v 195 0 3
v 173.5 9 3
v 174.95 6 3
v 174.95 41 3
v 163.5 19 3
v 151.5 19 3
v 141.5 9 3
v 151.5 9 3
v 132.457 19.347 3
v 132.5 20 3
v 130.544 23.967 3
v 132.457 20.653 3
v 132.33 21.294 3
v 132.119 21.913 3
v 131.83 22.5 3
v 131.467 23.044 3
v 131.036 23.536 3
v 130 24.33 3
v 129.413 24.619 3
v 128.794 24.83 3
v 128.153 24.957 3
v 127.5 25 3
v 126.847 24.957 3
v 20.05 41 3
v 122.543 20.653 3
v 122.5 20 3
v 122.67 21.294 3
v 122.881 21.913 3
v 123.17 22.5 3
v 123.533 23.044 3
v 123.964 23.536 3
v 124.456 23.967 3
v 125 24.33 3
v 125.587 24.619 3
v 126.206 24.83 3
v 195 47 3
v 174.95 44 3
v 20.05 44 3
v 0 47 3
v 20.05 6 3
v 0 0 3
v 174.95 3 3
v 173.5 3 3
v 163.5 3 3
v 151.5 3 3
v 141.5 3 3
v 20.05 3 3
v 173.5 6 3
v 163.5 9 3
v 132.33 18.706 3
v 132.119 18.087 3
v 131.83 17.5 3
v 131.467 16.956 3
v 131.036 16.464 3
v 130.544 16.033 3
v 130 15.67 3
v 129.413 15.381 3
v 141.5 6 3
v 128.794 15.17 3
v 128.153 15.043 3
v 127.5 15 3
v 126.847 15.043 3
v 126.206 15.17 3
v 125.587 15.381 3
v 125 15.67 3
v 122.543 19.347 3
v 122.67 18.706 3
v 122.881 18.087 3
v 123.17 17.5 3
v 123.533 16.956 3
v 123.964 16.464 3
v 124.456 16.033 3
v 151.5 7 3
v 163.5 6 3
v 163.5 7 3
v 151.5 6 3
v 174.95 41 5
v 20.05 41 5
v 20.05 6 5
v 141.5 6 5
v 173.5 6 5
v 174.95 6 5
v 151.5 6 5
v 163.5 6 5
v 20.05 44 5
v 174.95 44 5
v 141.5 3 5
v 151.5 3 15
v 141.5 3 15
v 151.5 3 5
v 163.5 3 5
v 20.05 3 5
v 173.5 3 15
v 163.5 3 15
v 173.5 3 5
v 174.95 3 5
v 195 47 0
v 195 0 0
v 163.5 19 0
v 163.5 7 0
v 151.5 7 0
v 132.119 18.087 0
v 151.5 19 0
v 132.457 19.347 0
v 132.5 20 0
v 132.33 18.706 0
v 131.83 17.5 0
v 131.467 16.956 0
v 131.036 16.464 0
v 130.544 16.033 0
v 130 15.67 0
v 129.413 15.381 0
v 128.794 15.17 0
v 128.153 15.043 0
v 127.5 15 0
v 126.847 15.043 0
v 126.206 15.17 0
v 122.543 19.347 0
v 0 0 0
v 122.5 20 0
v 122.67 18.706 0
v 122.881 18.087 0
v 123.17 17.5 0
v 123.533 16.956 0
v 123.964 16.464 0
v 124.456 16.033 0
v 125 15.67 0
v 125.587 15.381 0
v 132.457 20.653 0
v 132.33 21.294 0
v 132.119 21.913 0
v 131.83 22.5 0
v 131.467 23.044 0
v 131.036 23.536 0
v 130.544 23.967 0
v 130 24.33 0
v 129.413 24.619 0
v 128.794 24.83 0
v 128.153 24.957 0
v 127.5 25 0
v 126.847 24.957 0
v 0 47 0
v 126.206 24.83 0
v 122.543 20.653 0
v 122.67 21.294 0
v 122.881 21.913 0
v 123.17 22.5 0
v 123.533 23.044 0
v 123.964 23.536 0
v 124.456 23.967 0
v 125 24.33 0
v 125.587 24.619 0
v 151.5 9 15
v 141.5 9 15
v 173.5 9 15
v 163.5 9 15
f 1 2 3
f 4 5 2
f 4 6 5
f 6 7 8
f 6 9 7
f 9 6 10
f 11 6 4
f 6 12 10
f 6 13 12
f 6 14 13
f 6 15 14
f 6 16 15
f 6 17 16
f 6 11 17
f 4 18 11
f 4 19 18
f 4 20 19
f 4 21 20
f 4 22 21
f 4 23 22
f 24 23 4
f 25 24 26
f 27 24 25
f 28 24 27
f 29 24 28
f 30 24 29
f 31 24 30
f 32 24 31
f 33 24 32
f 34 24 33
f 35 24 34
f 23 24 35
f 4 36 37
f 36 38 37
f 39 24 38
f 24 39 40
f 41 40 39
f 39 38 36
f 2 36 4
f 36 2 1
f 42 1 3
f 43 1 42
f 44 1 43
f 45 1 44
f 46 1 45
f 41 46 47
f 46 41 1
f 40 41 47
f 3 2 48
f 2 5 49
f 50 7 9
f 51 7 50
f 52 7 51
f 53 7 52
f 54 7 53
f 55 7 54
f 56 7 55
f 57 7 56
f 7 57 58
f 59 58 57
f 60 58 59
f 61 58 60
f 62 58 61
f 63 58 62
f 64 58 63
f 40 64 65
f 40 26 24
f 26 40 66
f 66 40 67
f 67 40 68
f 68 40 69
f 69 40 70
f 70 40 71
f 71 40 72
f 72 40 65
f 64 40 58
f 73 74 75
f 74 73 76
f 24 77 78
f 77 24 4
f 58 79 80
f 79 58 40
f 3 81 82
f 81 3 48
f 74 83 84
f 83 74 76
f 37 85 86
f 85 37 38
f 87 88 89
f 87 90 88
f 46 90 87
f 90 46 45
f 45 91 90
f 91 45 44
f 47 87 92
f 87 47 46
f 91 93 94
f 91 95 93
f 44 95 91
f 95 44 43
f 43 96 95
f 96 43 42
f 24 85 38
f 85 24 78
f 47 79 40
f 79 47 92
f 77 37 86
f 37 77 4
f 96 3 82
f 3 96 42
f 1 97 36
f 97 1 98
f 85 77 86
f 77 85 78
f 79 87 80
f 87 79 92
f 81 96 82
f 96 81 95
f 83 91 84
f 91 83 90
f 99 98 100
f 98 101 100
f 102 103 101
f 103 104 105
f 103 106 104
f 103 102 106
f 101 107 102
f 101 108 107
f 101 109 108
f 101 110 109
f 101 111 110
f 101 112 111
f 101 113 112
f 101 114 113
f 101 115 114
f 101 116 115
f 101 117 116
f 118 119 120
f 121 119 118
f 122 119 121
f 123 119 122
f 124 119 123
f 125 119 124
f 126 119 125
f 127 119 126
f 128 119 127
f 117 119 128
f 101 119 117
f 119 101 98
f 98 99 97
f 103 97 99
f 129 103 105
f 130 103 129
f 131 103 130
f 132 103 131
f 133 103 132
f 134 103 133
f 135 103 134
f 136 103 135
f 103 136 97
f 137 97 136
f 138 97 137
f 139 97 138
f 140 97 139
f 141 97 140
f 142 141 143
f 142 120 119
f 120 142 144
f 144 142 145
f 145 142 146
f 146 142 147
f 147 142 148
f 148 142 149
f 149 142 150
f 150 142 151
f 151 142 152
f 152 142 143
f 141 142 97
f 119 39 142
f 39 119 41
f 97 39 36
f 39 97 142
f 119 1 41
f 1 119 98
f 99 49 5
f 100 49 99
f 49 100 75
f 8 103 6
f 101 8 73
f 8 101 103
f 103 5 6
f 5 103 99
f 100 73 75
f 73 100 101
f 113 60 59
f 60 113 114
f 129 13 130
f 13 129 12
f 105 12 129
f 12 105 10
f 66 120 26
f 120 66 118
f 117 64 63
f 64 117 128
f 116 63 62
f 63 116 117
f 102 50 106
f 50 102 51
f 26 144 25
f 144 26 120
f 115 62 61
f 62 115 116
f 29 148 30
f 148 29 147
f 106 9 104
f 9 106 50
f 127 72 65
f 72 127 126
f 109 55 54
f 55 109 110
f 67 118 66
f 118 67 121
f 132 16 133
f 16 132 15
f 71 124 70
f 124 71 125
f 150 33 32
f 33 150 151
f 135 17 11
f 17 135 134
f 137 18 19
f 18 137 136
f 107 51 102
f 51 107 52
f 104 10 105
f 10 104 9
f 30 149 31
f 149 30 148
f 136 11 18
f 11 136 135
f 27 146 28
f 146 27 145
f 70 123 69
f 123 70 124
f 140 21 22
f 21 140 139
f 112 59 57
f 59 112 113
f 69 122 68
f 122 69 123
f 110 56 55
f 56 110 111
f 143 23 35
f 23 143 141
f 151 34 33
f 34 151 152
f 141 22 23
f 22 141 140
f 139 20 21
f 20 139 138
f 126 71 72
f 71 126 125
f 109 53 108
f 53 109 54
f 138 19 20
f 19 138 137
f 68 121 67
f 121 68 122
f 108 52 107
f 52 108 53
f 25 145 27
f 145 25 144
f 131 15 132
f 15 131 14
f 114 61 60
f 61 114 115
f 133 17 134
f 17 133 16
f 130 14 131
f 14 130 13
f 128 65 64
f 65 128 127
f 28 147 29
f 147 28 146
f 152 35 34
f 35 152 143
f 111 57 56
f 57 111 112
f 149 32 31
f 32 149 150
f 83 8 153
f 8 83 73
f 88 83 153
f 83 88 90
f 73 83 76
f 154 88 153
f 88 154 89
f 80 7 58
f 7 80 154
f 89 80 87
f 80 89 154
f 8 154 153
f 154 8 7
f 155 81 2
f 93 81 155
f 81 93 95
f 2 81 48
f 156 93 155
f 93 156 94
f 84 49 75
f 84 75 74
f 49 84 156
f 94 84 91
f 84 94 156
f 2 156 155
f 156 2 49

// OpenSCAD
// file: Defines_v1.scad
/* spacing between the leds
 * usually around 12, can be forced
 * to 6-10 by bending strip
 */
space = 6;  

/* some space for the outermost leds
 * for better viewing angle
 */
margin = 10;

/* 15 leds (type 5050) with above spacing */
width = 15 * (5 + space) + 10 + 2 * margin;

/* box height, min. 42mm */
height = 47;

/* box depth, min 100mm for 4x3-keypad */
depth = 105;

/* max wall thickness */
thick=10;

/* grade of feet smoothness
 * below 10 looks bad
 * 10-16 is reasonable
 * above 16 takes much time to render
 */
grade = 12;

/* length of side stands 
 * should be enough to get box in right angle
 * should not exceed back of box
 */
stand = min(height + 20, depth - 40);

/* offset of usb plug from center */
usb_offs = 60;

/* calculated values */
bwidth = width + 14;
bheight = depth + 7;

/* size of led holes 
 * includes some margin for 5050 leds
 */
led = 5.75;

minimal = 1;
// main file
include <Defines_v1.scad>;

module Hinten() {
    union() {
        difference() {
            translate([width / 2, height / 2, 2.5]) 
                cube([width, height, 5], center = true);
            
            translate([0, 0, 4.5]) {
                translate([width / 2, height / 2, 0]) 
                    cube([width + 0.1, height - 12, 3], center = true);
                translate([width / 2, height, 0]) 
                    cube([width + 0.1, 6, 3], center = true);
                translate([width / 2, 0, 0]) 
                    cube([width + 0.1, 6, 3], center = true);
                translate([10, height / 2, 0]) 
                    cube([20.1, height + 0.1, 3], center = true);
                translate([width - 10, height / 2, 0]) 
                    cube([20.1, height + 0.1, 3], center = true);
            }
            translate([width / 2 + usb_offs, 13, 0.6]) 
                cube([12, 12, 5], center = true);    
        
            translate([width / 2 + 30, 20, 0.6]) 
                cylinder(5, 5, 5, $fn=48, center = true);
        }
        translate([width / 2 + usb_offs - 11, 6, 9]) 
            cube([10, 6, 12], center = true);        
        translate([width / 2 + usb_offs + 11, 6, 9]) 
            cube([10, 6, 12], center = true);        
    }
}

Hinten();
